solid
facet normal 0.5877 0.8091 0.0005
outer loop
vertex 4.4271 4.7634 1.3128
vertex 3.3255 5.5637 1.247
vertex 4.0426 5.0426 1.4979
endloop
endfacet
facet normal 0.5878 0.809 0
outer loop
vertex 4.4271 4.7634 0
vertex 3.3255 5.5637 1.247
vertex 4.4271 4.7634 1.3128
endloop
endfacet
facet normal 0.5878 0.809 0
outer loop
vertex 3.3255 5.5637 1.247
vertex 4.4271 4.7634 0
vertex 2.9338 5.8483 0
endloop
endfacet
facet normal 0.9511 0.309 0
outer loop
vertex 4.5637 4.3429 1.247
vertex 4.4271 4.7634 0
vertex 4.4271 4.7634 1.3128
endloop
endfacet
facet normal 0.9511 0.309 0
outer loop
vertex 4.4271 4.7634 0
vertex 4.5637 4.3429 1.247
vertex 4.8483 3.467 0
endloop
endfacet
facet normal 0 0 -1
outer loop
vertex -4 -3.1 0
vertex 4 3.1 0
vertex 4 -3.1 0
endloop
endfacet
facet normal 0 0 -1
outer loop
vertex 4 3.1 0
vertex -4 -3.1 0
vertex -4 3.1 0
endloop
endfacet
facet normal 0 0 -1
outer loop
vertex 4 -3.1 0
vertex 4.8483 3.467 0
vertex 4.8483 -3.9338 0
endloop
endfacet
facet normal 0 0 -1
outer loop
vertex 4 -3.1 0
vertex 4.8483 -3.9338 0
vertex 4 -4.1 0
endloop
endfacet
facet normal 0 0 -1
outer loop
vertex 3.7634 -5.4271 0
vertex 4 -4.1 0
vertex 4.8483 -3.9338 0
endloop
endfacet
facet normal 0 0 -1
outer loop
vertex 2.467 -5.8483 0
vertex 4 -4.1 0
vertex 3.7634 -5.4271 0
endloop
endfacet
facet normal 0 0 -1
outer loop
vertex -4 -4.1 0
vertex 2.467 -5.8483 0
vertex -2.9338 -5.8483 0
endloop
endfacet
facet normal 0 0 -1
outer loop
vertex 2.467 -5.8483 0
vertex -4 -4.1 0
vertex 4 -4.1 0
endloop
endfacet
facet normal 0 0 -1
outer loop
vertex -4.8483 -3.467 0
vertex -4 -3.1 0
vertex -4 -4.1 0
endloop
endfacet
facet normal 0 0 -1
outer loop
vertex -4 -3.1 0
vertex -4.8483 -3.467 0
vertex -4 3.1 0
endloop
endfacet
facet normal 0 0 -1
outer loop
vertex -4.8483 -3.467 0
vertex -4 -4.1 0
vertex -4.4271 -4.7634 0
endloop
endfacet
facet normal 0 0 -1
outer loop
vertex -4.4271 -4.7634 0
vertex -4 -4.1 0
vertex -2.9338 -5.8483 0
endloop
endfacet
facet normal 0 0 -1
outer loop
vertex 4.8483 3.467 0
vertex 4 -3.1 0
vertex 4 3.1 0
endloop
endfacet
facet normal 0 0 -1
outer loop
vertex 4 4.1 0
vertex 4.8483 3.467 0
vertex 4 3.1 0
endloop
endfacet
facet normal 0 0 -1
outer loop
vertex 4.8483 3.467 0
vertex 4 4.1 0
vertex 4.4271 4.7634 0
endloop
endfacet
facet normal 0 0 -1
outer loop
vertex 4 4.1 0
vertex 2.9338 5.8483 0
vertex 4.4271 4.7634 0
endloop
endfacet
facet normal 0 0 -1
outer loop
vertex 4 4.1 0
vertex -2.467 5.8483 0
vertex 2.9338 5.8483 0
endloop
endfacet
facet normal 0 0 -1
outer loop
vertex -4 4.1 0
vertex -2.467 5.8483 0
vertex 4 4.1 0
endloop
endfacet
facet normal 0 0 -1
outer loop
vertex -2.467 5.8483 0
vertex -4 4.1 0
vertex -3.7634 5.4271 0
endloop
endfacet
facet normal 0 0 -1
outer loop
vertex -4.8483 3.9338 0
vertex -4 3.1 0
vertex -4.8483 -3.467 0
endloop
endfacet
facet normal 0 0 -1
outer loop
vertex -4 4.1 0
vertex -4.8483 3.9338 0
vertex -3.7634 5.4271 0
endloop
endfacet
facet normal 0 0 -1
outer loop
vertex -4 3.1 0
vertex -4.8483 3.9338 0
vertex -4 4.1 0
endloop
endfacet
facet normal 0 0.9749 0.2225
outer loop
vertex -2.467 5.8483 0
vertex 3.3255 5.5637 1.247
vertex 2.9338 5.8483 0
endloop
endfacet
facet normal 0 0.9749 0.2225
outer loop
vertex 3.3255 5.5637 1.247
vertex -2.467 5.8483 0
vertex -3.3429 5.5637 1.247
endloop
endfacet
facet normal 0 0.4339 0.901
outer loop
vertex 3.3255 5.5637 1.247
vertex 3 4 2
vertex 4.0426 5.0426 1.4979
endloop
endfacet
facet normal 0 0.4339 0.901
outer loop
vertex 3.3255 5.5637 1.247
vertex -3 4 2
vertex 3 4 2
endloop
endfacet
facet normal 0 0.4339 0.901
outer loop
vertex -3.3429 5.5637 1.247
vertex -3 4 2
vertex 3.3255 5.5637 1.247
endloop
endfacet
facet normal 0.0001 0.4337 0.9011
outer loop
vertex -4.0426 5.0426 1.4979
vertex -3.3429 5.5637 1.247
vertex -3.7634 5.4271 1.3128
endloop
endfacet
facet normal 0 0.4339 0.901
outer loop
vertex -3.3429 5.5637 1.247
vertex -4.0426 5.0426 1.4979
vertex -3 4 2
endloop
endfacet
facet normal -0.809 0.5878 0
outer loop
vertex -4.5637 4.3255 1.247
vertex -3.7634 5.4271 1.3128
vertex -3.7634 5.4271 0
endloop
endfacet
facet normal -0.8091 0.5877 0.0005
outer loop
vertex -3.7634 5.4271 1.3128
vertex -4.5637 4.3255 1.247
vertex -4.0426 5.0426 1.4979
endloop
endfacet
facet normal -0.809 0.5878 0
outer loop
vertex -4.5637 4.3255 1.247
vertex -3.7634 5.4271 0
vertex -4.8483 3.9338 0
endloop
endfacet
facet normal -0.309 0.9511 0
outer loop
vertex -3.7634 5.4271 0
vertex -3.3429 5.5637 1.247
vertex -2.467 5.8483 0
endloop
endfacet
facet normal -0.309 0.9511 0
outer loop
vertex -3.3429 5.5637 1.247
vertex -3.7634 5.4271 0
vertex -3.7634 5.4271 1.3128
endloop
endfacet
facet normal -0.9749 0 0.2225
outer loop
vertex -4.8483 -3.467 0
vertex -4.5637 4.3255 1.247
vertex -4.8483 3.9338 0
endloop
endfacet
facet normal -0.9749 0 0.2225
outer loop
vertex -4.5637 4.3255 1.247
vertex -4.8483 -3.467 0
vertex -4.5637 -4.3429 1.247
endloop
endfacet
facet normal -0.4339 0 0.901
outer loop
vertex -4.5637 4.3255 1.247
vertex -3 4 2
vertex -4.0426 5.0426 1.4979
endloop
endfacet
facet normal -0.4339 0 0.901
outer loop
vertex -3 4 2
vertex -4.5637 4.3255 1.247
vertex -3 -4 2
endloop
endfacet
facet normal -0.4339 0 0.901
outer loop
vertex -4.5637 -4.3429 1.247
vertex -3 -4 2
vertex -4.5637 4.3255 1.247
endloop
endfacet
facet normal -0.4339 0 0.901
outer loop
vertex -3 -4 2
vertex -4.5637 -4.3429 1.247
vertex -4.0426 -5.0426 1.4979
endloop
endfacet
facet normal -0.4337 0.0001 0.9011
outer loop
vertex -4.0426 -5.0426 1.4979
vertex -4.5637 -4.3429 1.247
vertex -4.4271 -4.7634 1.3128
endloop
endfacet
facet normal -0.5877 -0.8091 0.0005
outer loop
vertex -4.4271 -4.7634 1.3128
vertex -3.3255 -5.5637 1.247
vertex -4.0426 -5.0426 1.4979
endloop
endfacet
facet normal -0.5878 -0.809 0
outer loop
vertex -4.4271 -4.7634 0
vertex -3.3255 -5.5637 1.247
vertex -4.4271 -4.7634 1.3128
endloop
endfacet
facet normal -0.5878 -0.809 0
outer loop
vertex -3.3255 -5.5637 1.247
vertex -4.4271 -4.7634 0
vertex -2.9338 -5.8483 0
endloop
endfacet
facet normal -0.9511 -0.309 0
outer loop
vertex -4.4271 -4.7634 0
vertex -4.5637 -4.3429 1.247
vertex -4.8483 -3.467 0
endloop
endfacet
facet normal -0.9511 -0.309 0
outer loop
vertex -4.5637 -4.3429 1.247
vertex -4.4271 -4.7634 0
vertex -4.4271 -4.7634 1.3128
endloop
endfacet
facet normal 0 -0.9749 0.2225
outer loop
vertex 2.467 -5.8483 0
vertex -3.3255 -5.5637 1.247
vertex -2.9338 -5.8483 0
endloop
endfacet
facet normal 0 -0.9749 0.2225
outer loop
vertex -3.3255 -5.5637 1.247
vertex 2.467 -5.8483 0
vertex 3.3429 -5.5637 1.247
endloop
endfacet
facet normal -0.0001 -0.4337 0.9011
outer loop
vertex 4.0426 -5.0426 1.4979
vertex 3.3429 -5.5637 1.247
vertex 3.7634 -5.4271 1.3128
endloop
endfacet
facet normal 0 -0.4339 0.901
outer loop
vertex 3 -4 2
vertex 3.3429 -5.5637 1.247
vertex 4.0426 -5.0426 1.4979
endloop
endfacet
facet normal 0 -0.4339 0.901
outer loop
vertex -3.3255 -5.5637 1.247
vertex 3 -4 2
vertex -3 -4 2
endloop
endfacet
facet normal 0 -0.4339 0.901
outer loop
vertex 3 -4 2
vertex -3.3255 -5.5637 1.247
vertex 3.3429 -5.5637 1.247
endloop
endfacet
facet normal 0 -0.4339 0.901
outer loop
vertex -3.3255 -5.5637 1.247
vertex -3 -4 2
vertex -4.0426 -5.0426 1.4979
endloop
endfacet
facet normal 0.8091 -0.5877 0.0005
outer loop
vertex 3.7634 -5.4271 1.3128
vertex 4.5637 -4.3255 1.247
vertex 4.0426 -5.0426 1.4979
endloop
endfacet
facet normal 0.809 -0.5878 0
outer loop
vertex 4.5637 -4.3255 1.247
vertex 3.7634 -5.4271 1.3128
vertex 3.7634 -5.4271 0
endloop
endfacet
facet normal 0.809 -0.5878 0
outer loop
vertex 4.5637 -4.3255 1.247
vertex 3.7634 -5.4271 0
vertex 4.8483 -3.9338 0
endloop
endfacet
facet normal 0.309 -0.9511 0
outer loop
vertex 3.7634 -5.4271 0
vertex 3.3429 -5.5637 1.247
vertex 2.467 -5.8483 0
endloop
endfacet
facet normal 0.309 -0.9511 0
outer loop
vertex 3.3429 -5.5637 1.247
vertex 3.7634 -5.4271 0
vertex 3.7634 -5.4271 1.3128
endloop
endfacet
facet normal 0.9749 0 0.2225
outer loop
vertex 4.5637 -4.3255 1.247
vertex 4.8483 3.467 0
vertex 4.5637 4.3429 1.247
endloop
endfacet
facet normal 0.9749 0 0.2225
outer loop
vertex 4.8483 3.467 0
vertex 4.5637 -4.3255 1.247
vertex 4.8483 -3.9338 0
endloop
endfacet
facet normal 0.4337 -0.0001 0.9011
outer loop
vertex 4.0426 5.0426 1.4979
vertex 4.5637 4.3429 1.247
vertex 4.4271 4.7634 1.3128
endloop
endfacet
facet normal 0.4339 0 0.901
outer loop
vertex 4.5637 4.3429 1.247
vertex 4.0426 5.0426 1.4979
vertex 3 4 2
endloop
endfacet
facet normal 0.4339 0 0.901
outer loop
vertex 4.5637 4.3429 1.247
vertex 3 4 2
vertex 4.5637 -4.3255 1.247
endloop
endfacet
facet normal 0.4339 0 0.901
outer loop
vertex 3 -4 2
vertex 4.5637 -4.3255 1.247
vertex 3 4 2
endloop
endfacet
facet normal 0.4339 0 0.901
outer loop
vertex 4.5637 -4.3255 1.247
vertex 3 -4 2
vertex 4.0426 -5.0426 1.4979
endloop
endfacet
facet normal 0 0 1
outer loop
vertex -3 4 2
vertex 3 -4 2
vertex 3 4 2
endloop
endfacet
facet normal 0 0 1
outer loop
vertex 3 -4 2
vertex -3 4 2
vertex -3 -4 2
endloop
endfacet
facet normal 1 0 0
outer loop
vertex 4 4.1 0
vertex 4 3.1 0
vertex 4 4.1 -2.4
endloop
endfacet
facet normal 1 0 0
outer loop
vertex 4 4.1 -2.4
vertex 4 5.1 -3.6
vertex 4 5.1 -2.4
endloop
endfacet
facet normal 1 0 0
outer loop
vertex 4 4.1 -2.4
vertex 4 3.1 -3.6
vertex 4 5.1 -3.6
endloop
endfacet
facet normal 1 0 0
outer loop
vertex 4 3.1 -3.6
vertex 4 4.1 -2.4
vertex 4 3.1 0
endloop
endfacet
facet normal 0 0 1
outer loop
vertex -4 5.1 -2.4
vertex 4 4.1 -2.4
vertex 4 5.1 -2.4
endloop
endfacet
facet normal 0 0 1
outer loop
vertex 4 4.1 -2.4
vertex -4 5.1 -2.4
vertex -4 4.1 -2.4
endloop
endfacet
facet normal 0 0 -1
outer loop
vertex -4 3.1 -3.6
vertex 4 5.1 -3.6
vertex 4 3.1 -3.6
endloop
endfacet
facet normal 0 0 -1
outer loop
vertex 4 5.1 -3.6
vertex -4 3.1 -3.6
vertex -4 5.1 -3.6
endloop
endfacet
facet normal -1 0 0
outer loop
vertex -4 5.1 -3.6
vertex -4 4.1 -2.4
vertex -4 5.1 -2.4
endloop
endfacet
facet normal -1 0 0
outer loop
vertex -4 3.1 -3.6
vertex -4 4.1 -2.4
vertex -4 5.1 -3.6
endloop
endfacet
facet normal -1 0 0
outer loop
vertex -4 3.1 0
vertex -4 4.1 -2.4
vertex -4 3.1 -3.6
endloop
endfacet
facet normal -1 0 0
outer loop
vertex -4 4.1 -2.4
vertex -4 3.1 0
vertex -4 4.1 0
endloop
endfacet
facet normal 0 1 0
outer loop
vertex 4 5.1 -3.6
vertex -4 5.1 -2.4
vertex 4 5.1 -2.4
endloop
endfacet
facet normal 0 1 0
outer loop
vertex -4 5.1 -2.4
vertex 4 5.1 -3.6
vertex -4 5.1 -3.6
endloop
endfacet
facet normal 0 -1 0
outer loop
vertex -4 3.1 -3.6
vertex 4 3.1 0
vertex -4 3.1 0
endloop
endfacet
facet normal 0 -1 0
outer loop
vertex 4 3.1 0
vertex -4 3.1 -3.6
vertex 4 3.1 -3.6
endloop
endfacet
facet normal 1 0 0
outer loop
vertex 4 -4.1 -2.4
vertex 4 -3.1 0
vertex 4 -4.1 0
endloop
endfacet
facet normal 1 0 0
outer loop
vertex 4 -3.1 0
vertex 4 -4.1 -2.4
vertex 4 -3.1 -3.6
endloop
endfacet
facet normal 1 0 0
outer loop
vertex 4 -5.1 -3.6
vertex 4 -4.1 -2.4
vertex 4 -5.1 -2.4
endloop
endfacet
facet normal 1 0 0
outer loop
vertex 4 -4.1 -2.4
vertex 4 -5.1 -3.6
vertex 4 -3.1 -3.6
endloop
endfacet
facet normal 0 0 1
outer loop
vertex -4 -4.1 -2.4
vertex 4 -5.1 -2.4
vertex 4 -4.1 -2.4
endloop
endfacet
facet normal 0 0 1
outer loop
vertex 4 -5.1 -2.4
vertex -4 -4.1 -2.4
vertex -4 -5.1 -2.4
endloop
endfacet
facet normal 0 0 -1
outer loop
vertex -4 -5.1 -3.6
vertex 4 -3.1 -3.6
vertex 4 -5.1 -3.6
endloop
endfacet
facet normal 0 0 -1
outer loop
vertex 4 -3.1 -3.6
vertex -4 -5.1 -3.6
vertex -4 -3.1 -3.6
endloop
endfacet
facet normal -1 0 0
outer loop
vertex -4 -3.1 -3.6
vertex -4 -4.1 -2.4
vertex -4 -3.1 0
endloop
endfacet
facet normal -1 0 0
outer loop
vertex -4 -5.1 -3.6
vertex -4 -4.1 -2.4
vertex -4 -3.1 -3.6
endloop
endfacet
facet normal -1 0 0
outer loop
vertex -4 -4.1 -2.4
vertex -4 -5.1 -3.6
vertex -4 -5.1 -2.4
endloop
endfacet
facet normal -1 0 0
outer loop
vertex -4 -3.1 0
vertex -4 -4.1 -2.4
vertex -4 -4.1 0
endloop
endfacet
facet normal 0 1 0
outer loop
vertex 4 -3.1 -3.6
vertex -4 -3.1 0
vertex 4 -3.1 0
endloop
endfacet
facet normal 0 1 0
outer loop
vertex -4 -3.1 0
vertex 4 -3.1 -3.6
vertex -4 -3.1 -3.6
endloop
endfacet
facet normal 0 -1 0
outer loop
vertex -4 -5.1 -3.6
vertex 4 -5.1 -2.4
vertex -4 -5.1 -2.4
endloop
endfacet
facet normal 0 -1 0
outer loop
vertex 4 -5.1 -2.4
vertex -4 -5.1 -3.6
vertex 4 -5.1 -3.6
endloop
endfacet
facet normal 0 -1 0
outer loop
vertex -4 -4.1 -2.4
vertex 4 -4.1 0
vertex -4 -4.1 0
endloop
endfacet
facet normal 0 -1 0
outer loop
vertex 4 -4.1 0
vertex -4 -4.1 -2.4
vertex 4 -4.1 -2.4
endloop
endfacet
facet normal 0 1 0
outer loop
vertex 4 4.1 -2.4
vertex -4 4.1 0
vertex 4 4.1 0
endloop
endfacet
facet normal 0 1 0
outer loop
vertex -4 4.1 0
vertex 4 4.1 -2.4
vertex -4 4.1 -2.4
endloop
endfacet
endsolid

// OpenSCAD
// file: inc/functions.scad
// PRUSA iteration3
// Functions used in many files
// GNU GPL v3
// Josef Průša <josefprusa@me.com>
// Václav 'ax' Hůla <axtheb@gmail.com>
// Vlnofka <>
// http://www.reprap.org/wiki/Prusa_Mendel
// http://github.com/prusajr/PrusaMendel

module roundcorner(diameter){
	difference(){
		cube(size = [diameter,diameter,99], center = false);
		translate(v = [diameter, diameter, 0]) cylinder(h = 100, r=diameter, center=true);
	}
}
module nut(d,h,horizontal=true){
    cornerdiameter =  (d / 2) / cos (180 / 6);
    cylinder(h = h, r = cornerdiameter, $fn = 6);
    if(horizontal){
        for(i = [1:6]){
            rotate([0,0,60*i]) translate([-cornerdiameter-0.2,0,0]) rotate([0,0,-45]) cube([2,2,h]);
        }
    }
}

// Based on nophead research
module polyhole(d, h, center=false) {
    n = max(round(2 * d),3);
    rotate([0,0,180])
        cylinder(h = h, r = (d / 2) / cos (180 / n), $fn = n);
}

// make it interchangeable between this and cylinder
module cylinder_poly(r, h, center=false){
    polyhole(d=r*2, h=h, center=center);
}

module fillet(radius, height=100, $fn=0) {
    //this creates acutal fillet
    translate([-radius, -radius, -height/2-0.01])
        difference() {
            cube([radius*2, radius*2, height+0.02]);
            cylinder(r=radius, h=height+0.02, $fn=$fn);
        }
}

module cube_fillet(size, radius=-1, vertical=[3,3,3,3], top=[0,0,0,0], bottom=[0,0,0,0], center=false, $fn=0){
    //
    if (center) {
        cube_fillet_inside(size, radius, vertical, top, bottom, $fn);
    } else {
        translate([size[0]/2, size[1]/2, size[2]/2])
            cube_fillet_inside(size, radius, vertical, top, bottom, $fn);
    }
}

module cube_negative_fillet(size, radius=-1, vertical=[3,3,3,3], top=[0,0,0,0], bottom=[0,0,0,0], $fn=0){

    j=[1,0,1,0];

    for (i=[0:3]) {
        if (radius > -1) {
            rotate([0, 0, 90*i]) translate([size[1-j[i]]/2, size[j[i]]/2, 0]) fillet(radius, size[2], $fn=$fn);
        } else {
            rotate([0, 0, 90*i]) translate([size[1-j[i]]/2, size[j[i]]/2, 0]) fillet(vertical[i], size[2], $fn=$fn);
        }
        rotate([90*i, -90, 0]) translate([size[2]/2, size[j[i]]/2, 0 ]) fillet(top[i], size[1-j[i]], $fn=$fn);
        rotate([90*(4-i), 90, 0]) translate([size[2]/2, size[j[i]]/2, 0]) fillet(bottom[i], size[1-j[i]], $fn=$fn);

    }
}

module cube_fillet_inside(size, radius=-1, vertical=[3,3,3,3], top=[0,0,0,0], bottom=[0,0,0,0], $fn=0){
    //makes CENTERED cube with round corners
    // if you give it radius, it will fillet vertical corners.
    //othervise use vertical, top, bottom arrays
    //when viewed from top, it starts in upper right corner (+x,+y quadrant) , goes counterclockwise
    //top/bottom fillet starts in direction of Y axis and goes CCW too


    if (radius == 0) {
        cube(size, center=true);
    } else {
        difference() {
            cube(size, center=true);
            cube_negative_fillet(size, radius, vertical, top, bottom, $fn);
        }
    }
}


module nema17(places=[1,1,1,1], size=15.5, h=10, holes=false, shadow=false, $fn=24){
    for (i=[0:3]) {
        if (places[i] == 1) {
            rotate([0, 0, 90*i]) translate([size, size, 0]) {
                if (holes) {
                    #rotate([0, 0, -90*i])  translate([0,0,-10]) screw(r=1.7, slant=false, head_drop=13, $fn=$fn, h=h+12);
                } else {
                    rotate([0, 0, -90*i]) cylinder(h=h, r=5.5, $fn=$fn);
                }
            }
        }
    }
    if (shadow != false) {
        %translate ([0, 0, shadow+21+3]) cube([42,42,42], center = true);
    //flange
        %translate ([0, 0, shadow+21+3-21-1]) cylinder(r=11,h=2, center = true, $fn=20);
    //shaft
        %translate ([0, 0, shadow+21+3-21-7]) cylinder(r=2.5,h=14, center = true);
    }
}

module screw(h=20, r=2, r_head=3.5, head_drop=0, slant=true, poly=false, $fn=0){
    //makes screw with head
    //for substraction as screw hole
    if (poly) {
        cylinder_poly(h=h, r=r, $fn=$fn);
    } else {
        cylinder(h=h, r=r, $fn=$fn);
    }
    if (slant) {
        translate([0, 0, head_drop-0.01]) cylinder(h=r_head, r2=0, r1=r_head, $fn=$fn);
    }

    if (head_drop > 0) {
        translate([0, 0, -0.01]) cylinder(h=head_drop+0.01, r=r_head, $fn=$fn);
    }
}
module screw_cylinder(r_head=5.25,r=3.25,head_drop=6.2,slant=false){
	screw(r_head=r_head,head_drop=head_drop,r=r, slant=slant);

}

//screw_cylinder();
//cube_fillet([10,20,30], vertical=[3,2,0,0], top=[3,2,0,5], bottom=[3,2,0,5]);
//cube_fillet([10,20,30], radius=2, top=[7,2,7,2]);
// file: inc/metric.scad
// PRUSA iteration3
// Default metric sizes
// GNU GPL v3
// Josef Průša <josefprusa@me.com>
// http://www.reprap.org/wiki/Prusa_Mendel
// http://github.com/prusajr/PrusaMendel

// DONT CHANGE THIS FILE! ALTER VALUES IN CONFIGURATION.SCAD INSTEAD

// RODS

threaded_rod_diameter = 8.7;
threaded_rod_diameter_horizontal = 8.7;
smooth_bar_diameter = 8;
smooth_bar_diameter_horizontal = 8.8;

// Nuts and bolts

m8_diameter = 9;
m8_nut_diameter = 14.1;

m4_diameter = 4.5;
m4_nut_diameter = 9;
m4_nut_diameter_horizontal=4.8;

m3_diameter = 3.6;
m3_nut_diameter = 5.3;
m3_nut_diameter_horizontal = 6.1;

// Bushing holder

bushing_core_diameter = smooth_bar_diameter;
bushing_material_thickness = 1;

// Motors

motor_shaft = 5.5;
// file: configuration.scad
// PRUSA iteration3
// Configuration file
// GNU GPL v3
// Josef Průša <josefprusa@me.com>
// Václav 'ax' Hůla <axtheb@gmail.com>
// http://www.reprap.org/wiki/Prusa_Mendel
// http://github.com/prusajr/PrusaMendel

// PLEASE SELECT ONE OF THE CONFIGURATIONS BELOW
// BY UN-COMMENTING IT

// Uncomment for metric settings
// METRIC METRIC METRIC METRIC METRIC METRIC METRIC METRIC 

include <inc/metric.scad>;

// Custom settings here, tailor to your supplies and print settings

// Select your belt type ******************************************************

//T2.5
//belt_tooth_distance = 2.5;
//belt_tooth_ratio = 0.5;

//T5 (strongly discouraged)
belt_tooth_distance = 5;
belt_tooth_ratio = 0.75;

//HTD3
//belt_tooth_distance = 3;
//belt_tooth_ratio = 0.75;

//MXL
//belt_tooth_distance = 2.032;
//belt_tooth_ratio = 0.64;

// Choose bearing/bushing configuration ***************************************

//Choose from:

// 0 = Z as lm[e]8uu, X and Y bushings
// 1 = all bushings
// 2 = all bearings [default. Do not change unless you really know what you are doing]
// DO NOT OFFER 0 or 1 VARIANTS FOR SALE. We really mean that. In the long run it hurts everyone.

bearing_choice = 2;

// Bushing version
// 0 = square igus housings. By igus we mean JFM-0810-10 or GFM-0810-10
// 1 = round igus (works better if printed precisely)
// 2 = bronze self-aligning bushings
bushing_type = 0;

//Bearing version
// 0 = default lm8uu
// 1 = lme8uu
bearing_type = 0;

// Select idler bearing size **************************************************

// 0 = 608 [standard skate bearings]
// 1 = 624 [roughly same diameter as pulley, makes belt parallel so its prettier]

idler_bearing = 0;

// Thickness of the XZ plate board
board_thickness = 12;

//Layer height * width over thickness. Used for idler sleeve
single_wall_width = 0.3*2.2;

// END of custom settings


// You are not supposed to change this
board_to_xz_distance = 26;
xaxis_rod_distance = 45;
carriage_l = 74;
carriage_hole_to_side = 5;
carriage_hole_height = 4;

//calculated from settings

idler_size = (idler_bearing == 0) ? 22 : 13;

//use 4.5 for 608, 2.5 for 624
idler_size_inner_r = (idler_bearing == 0) ? 4.5 : 2.5;

idler_width = (idler_bearing == 0) ? 9 : 5;

// CHANGE ONLY THE STUFF YOU KNOW
// IT WILL REPLACE DEFAULT SETTING

// RODS

// threaded_rod_diameter = 0;
// threaded_rod_diameter_horizontal = 0;
// smooth_bar_diameter = 0;
// smooth_bar_diameter_horizontal = 0;

// Nuts and bolts

// m8_diameter = 0;
// m8_nut_diameter = 0;

// m4_diameter = 0;
// m4_nut_diameter = 0;

// m3_diameter = 0;
// m3_nut_diameter = 0;

// Bushing holder

// bushing_core_diameter = smooth_bar_diameter;
// bushing_material_thickness = 0;

///counted stuff
m3_nut_diameter_bigger = ((m3_nut_diameter  / 2) / cos (180 / 6))*2;

// functions
include <inc/functions.scad>


// These constants define the geometry of the complete-printer.scad

//x_smooth_rod_length=325;
//y_smooth_rod_length=405;
//z_smooth_rod_length=235;
bed_x_size=225;
bed_y_size=225;

x_smooth_rod_length=450+board_thickness*2+10; // 492 for 16mm thickness; 484 for 12mm thickness
y_smooth_rod_length=470;
z_smooth_rod_length=405;  
bed_x_size=225;
bed_y_size=225;
// main file
include <configuration.scad>

wire_holder();

module wire_holder(){
	translate([-5,-6,0])cube_fillet([10,12,2],top=[2,2,2,2],$fn=36);
	translate([0,4.1,-3])color("red")cube([8,2,1.2],center=true);
	translate([0,-4.1,-3])color("red")cube([8,2,1.2],center=true);
	translate([0,-3.6,-1.25])cube([8,1,2.5],center=true);
	translate([0,3.6,-1.25])cube([8,1,2.5],center=true);
}
